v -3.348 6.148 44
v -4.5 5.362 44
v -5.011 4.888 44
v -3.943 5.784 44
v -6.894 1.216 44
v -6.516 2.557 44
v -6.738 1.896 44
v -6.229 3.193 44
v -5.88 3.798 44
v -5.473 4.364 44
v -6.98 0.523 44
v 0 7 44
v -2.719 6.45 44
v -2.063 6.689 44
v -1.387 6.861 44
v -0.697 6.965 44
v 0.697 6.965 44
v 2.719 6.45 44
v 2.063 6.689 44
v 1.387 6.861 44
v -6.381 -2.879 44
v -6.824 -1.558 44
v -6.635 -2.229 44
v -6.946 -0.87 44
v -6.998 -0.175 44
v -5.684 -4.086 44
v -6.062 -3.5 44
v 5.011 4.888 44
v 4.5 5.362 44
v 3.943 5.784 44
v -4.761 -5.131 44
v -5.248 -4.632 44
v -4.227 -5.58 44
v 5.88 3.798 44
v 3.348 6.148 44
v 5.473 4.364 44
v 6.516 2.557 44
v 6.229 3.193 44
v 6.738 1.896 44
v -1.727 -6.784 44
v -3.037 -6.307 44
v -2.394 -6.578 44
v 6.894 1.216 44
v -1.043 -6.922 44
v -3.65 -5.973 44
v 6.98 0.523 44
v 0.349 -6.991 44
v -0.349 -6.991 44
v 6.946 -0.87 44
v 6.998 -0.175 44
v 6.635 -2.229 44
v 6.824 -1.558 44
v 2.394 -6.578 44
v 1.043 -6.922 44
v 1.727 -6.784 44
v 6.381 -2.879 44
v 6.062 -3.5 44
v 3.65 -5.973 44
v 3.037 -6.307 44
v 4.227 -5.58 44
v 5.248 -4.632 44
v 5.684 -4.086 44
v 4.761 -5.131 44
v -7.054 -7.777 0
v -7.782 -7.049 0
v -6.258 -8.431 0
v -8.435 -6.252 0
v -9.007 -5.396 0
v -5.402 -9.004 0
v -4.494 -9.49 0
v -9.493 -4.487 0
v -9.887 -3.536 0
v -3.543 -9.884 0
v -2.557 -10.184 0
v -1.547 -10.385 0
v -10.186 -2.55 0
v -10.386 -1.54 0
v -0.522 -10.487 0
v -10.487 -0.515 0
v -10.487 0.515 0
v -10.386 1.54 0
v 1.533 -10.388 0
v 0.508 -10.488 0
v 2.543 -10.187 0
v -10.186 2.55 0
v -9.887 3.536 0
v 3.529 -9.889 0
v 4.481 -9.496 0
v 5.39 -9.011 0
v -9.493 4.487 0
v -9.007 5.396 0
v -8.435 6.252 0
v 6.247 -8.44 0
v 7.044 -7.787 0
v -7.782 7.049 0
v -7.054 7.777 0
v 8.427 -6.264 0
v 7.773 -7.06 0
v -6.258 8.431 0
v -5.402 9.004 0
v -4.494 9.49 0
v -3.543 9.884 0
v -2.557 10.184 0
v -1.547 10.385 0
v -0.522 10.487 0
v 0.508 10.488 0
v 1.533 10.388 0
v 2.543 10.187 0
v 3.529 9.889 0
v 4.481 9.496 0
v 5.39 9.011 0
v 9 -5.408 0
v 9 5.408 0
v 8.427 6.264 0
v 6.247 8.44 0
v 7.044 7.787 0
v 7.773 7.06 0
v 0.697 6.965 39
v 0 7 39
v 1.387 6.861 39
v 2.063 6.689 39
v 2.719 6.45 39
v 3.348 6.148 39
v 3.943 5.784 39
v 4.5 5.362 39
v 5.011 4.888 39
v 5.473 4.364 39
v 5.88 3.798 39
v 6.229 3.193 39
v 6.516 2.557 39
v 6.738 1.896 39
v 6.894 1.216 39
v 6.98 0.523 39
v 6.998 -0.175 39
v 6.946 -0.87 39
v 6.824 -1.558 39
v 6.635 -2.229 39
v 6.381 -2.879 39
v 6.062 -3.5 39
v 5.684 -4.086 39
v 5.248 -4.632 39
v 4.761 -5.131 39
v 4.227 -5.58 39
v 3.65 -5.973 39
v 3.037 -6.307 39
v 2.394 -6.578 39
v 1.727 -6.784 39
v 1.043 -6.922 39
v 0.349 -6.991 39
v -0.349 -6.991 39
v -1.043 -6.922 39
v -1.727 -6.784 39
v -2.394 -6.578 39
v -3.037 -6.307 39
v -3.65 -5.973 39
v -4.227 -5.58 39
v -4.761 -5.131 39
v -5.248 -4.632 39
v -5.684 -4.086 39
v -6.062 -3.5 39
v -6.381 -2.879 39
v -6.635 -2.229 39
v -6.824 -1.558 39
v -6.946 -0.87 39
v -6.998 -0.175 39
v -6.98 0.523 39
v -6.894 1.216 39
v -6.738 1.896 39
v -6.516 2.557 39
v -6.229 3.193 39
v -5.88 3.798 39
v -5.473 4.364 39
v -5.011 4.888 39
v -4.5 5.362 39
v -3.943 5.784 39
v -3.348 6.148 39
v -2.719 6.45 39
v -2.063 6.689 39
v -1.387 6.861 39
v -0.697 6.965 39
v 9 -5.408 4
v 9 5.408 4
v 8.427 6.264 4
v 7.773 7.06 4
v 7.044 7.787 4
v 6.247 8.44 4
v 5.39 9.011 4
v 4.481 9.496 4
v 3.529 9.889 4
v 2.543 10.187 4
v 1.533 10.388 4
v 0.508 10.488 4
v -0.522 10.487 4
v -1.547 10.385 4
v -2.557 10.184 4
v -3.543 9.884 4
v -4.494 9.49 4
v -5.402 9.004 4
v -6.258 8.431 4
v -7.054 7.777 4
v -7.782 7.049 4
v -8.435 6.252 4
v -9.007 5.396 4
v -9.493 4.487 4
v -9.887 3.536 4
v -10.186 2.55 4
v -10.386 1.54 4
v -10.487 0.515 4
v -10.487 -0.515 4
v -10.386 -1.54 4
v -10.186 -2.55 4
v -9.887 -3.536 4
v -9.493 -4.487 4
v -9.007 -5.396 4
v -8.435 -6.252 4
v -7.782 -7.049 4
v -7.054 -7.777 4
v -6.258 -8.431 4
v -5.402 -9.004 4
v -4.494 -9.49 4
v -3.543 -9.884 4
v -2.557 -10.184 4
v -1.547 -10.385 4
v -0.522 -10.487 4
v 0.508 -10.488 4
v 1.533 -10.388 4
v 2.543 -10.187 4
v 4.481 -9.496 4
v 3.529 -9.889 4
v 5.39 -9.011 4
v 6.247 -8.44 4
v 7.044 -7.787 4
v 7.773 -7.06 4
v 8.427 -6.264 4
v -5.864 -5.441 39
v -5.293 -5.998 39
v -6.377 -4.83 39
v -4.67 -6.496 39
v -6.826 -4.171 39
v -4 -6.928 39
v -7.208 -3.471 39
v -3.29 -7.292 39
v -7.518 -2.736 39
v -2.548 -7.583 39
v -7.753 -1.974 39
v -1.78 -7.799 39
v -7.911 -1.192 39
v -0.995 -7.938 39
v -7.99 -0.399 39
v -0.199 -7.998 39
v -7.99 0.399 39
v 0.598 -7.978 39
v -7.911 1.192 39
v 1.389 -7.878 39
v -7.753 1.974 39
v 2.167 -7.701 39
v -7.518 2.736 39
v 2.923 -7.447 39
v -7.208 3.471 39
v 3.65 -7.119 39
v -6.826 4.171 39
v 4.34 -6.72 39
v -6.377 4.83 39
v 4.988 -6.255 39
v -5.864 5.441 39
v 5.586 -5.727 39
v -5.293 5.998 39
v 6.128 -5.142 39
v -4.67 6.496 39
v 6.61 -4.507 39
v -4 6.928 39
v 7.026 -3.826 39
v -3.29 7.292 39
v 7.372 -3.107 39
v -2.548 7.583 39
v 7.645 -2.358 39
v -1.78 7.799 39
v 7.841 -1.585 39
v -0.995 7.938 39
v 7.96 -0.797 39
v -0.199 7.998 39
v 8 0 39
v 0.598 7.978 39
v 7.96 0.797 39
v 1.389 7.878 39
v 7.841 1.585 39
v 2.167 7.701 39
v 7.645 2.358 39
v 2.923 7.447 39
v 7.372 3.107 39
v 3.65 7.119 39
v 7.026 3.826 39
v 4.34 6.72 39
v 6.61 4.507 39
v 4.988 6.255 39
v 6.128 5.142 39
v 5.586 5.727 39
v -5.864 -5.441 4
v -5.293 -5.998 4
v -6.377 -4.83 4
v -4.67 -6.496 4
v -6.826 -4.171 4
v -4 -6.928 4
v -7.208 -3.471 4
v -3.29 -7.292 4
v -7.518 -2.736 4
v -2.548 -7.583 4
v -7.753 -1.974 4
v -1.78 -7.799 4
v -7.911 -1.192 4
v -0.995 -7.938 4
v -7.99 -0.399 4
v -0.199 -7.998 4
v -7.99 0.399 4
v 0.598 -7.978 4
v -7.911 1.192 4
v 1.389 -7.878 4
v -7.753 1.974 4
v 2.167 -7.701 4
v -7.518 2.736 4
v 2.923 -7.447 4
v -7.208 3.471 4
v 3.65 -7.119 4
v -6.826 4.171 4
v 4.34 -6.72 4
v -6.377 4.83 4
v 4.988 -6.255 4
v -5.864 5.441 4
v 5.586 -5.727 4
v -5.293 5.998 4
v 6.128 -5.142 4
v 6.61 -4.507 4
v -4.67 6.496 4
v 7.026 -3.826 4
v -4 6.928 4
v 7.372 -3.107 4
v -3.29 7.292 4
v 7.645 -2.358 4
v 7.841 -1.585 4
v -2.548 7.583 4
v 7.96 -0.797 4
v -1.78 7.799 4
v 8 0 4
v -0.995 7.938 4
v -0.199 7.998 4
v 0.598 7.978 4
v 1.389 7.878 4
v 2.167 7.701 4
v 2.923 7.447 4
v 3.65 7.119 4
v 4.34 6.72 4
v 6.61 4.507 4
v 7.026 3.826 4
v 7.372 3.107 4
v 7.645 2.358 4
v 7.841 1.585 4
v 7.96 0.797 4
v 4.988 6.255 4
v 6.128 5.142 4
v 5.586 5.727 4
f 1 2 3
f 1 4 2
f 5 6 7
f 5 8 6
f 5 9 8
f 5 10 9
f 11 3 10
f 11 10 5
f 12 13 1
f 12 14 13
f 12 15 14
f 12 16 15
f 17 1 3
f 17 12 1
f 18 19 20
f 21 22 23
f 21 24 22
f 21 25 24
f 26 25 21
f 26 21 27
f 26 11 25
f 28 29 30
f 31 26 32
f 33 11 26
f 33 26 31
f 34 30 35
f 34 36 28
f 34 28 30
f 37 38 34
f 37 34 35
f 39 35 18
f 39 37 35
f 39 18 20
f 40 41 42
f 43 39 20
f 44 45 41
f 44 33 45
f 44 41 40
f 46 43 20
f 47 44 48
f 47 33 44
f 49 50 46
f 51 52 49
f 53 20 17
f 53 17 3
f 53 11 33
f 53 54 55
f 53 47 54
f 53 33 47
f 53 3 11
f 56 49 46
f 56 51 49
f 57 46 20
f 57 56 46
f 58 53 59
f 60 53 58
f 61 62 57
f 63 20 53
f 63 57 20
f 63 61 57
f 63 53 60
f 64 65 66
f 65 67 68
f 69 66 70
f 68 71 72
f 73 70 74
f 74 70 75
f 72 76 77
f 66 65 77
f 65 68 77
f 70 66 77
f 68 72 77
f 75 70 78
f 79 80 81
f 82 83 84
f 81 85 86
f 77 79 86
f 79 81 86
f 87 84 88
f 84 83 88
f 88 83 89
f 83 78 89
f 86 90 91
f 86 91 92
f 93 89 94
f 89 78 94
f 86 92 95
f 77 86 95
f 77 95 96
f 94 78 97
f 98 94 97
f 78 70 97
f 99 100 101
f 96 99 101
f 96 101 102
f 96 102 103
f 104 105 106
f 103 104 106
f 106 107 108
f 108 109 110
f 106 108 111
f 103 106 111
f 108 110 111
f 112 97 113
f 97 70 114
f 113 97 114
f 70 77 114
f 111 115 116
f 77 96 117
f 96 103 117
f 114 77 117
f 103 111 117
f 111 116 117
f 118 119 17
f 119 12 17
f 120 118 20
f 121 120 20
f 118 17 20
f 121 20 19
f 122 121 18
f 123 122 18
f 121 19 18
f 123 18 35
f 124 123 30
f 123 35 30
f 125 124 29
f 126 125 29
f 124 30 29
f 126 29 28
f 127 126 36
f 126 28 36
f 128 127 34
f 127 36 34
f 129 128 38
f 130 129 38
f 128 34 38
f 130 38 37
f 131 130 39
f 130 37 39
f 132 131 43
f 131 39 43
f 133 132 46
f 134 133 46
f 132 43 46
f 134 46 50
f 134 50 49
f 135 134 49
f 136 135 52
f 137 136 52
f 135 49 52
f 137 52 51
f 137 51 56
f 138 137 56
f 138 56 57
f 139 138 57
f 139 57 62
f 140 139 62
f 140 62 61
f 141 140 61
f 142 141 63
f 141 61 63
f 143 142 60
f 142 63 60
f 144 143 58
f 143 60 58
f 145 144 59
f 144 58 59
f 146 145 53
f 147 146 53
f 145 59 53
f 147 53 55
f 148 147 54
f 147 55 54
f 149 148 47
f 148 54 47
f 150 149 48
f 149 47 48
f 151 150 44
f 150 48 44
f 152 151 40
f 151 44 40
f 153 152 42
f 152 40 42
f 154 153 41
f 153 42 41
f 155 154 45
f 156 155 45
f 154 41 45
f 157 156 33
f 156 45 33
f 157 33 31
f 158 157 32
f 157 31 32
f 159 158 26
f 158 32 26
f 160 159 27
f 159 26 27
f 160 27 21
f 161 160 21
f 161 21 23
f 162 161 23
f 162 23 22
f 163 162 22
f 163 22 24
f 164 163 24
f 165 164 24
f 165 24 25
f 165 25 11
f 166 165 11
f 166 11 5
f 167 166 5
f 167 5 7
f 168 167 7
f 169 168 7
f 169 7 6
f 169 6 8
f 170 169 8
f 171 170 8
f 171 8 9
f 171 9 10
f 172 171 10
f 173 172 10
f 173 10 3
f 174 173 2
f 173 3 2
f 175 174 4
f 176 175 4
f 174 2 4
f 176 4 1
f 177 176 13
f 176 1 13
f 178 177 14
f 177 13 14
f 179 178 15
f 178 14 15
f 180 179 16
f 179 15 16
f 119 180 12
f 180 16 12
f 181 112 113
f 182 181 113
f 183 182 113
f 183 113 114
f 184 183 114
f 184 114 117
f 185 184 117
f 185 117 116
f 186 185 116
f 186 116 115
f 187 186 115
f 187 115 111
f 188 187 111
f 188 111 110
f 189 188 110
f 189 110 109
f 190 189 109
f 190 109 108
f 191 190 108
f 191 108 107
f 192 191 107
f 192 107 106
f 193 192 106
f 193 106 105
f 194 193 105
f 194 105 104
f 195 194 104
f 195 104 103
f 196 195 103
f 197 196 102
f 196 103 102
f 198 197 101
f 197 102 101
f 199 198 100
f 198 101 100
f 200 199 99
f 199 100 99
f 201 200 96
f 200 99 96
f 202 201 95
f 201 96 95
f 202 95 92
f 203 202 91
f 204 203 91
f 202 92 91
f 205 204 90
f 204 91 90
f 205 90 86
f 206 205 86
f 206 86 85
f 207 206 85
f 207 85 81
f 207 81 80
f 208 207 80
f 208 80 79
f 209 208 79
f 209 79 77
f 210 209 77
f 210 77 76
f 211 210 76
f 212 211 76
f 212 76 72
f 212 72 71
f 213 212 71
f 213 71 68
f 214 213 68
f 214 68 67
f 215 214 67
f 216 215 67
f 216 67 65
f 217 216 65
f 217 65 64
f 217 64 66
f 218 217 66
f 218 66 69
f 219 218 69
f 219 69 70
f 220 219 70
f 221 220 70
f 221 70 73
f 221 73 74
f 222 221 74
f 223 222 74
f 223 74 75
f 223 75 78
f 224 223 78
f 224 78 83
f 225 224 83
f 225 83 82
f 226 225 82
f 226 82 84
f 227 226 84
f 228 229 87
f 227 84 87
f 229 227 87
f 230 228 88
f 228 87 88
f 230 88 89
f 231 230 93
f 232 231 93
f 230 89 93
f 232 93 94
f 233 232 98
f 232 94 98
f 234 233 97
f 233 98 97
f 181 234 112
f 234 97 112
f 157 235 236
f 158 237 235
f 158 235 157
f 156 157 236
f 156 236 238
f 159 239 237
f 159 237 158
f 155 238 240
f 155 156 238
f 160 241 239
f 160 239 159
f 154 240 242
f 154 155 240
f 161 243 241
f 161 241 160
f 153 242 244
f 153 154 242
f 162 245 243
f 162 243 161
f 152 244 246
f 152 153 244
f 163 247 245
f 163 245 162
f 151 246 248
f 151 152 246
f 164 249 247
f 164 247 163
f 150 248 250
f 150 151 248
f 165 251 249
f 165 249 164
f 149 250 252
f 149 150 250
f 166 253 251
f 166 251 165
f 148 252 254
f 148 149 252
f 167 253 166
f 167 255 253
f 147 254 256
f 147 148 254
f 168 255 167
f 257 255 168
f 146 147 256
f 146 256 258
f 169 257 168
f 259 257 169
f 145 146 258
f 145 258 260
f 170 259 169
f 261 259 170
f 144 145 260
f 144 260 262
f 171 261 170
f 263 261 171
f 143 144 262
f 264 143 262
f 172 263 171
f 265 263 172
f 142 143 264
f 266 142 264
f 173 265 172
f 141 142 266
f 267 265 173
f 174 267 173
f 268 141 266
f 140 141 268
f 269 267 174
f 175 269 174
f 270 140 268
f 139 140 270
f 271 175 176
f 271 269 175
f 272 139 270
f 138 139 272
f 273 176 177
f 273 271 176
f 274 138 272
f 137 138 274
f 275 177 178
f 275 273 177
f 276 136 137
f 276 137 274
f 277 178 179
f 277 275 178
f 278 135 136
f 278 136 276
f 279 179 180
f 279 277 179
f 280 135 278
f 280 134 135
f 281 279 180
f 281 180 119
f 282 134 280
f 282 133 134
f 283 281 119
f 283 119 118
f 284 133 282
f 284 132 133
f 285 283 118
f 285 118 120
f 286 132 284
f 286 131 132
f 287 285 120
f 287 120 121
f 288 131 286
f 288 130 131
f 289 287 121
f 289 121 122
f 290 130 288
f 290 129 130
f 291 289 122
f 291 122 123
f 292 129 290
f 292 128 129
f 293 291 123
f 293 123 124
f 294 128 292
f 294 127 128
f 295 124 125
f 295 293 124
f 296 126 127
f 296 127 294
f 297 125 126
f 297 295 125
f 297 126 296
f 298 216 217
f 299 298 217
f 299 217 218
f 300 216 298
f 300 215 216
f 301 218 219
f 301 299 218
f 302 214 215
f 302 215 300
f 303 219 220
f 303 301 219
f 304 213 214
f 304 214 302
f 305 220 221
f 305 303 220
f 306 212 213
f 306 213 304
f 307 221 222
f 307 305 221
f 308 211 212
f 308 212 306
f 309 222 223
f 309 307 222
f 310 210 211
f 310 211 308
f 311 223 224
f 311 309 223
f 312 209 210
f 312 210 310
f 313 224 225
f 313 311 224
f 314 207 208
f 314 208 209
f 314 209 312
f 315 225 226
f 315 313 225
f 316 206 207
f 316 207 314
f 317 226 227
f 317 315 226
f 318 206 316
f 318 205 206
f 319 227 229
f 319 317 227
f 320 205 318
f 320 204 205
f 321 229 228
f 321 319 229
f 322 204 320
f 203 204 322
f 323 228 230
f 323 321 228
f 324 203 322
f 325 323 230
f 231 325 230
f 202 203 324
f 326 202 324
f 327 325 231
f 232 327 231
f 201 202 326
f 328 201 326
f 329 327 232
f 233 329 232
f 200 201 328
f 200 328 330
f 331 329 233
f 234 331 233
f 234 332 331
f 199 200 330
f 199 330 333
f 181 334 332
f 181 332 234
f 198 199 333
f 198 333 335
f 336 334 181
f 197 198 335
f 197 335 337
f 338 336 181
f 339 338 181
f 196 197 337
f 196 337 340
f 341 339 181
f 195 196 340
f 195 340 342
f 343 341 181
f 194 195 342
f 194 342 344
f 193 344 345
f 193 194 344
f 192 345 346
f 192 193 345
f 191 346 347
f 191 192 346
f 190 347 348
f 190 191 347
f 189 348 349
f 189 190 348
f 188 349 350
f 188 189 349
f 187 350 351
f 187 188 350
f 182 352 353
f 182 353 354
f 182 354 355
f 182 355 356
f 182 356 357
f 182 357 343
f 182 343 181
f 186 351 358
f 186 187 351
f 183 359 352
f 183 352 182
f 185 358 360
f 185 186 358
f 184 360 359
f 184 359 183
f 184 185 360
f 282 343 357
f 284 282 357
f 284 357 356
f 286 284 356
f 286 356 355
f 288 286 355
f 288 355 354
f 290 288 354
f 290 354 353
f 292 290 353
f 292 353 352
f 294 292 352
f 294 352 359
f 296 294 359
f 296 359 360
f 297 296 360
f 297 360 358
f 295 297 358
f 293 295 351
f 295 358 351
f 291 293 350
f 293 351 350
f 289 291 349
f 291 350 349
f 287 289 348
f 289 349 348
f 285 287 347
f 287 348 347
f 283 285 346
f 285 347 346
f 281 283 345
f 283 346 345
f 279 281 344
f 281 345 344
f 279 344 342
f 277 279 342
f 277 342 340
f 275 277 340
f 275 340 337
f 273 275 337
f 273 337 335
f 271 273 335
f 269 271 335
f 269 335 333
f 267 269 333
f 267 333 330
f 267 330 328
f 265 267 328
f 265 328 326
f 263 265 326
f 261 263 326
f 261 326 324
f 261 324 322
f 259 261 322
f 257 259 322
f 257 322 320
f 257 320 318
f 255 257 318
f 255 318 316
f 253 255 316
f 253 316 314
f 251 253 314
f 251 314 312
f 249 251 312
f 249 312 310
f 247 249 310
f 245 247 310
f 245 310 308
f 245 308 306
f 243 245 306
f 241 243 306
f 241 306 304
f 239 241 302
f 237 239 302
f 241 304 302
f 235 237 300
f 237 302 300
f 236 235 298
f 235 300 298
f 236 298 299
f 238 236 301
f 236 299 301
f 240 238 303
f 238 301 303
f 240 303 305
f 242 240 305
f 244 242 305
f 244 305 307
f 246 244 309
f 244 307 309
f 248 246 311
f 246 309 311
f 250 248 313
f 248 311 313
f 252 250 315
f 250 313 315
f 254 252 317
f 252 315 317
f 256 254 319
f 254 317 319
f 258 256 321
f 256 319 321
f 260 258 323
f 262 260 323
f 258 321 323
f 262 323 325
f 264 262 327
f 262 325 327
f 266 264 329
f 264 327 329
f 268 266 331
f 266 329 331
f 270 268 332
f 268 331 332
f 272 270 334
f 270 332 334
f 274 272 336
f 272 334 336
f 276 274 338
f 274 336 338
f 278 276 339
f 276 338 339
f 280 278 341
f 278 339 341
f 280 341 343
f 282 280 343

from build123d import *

# Parameters (mm, degrees)
F0_R     = 10.5
F1_DEPTH = 4
F2_R     = 8
F3_DEPTH = 39
F4_W     = 7
F4_H     = 5
F6_W     = 5.926284
F6_H     = 21.135783
F7_DEPTH = 6


with BuildPart() as f1:
    # F0 (on Top) → F1 (new body)
    with BuildSketch(Plane.XY):
        Circle(F0_R)
    extrude(amount=F1_DEPTH)

    # F2 (on Top) → F3 (join)
    with BuildSketch(Plane.XY):
        Circle(F2_R)
    extrude(amount=F3_DEPTH)

    # F4 (on Right) → F5 (revolve)
    with BuildSketch(Plane.YZ):
        with Locations((3.5, 41.5)):
            Rectangle(F4_W, F4_H)
    revolve(axis=Axis((0, 0, 41.5), (0, 0, -1)))

    # F6 (on Top) → F7 (cut)
    with BuildSketch(Plane.XY):
        with Locations((11.963142, 0.046621)):
            Rectangle(F6_W, F6_H)
    extrude(amount=F7_DEPTH, mode=Mode.SUBTRACT)


solid = f1.part
